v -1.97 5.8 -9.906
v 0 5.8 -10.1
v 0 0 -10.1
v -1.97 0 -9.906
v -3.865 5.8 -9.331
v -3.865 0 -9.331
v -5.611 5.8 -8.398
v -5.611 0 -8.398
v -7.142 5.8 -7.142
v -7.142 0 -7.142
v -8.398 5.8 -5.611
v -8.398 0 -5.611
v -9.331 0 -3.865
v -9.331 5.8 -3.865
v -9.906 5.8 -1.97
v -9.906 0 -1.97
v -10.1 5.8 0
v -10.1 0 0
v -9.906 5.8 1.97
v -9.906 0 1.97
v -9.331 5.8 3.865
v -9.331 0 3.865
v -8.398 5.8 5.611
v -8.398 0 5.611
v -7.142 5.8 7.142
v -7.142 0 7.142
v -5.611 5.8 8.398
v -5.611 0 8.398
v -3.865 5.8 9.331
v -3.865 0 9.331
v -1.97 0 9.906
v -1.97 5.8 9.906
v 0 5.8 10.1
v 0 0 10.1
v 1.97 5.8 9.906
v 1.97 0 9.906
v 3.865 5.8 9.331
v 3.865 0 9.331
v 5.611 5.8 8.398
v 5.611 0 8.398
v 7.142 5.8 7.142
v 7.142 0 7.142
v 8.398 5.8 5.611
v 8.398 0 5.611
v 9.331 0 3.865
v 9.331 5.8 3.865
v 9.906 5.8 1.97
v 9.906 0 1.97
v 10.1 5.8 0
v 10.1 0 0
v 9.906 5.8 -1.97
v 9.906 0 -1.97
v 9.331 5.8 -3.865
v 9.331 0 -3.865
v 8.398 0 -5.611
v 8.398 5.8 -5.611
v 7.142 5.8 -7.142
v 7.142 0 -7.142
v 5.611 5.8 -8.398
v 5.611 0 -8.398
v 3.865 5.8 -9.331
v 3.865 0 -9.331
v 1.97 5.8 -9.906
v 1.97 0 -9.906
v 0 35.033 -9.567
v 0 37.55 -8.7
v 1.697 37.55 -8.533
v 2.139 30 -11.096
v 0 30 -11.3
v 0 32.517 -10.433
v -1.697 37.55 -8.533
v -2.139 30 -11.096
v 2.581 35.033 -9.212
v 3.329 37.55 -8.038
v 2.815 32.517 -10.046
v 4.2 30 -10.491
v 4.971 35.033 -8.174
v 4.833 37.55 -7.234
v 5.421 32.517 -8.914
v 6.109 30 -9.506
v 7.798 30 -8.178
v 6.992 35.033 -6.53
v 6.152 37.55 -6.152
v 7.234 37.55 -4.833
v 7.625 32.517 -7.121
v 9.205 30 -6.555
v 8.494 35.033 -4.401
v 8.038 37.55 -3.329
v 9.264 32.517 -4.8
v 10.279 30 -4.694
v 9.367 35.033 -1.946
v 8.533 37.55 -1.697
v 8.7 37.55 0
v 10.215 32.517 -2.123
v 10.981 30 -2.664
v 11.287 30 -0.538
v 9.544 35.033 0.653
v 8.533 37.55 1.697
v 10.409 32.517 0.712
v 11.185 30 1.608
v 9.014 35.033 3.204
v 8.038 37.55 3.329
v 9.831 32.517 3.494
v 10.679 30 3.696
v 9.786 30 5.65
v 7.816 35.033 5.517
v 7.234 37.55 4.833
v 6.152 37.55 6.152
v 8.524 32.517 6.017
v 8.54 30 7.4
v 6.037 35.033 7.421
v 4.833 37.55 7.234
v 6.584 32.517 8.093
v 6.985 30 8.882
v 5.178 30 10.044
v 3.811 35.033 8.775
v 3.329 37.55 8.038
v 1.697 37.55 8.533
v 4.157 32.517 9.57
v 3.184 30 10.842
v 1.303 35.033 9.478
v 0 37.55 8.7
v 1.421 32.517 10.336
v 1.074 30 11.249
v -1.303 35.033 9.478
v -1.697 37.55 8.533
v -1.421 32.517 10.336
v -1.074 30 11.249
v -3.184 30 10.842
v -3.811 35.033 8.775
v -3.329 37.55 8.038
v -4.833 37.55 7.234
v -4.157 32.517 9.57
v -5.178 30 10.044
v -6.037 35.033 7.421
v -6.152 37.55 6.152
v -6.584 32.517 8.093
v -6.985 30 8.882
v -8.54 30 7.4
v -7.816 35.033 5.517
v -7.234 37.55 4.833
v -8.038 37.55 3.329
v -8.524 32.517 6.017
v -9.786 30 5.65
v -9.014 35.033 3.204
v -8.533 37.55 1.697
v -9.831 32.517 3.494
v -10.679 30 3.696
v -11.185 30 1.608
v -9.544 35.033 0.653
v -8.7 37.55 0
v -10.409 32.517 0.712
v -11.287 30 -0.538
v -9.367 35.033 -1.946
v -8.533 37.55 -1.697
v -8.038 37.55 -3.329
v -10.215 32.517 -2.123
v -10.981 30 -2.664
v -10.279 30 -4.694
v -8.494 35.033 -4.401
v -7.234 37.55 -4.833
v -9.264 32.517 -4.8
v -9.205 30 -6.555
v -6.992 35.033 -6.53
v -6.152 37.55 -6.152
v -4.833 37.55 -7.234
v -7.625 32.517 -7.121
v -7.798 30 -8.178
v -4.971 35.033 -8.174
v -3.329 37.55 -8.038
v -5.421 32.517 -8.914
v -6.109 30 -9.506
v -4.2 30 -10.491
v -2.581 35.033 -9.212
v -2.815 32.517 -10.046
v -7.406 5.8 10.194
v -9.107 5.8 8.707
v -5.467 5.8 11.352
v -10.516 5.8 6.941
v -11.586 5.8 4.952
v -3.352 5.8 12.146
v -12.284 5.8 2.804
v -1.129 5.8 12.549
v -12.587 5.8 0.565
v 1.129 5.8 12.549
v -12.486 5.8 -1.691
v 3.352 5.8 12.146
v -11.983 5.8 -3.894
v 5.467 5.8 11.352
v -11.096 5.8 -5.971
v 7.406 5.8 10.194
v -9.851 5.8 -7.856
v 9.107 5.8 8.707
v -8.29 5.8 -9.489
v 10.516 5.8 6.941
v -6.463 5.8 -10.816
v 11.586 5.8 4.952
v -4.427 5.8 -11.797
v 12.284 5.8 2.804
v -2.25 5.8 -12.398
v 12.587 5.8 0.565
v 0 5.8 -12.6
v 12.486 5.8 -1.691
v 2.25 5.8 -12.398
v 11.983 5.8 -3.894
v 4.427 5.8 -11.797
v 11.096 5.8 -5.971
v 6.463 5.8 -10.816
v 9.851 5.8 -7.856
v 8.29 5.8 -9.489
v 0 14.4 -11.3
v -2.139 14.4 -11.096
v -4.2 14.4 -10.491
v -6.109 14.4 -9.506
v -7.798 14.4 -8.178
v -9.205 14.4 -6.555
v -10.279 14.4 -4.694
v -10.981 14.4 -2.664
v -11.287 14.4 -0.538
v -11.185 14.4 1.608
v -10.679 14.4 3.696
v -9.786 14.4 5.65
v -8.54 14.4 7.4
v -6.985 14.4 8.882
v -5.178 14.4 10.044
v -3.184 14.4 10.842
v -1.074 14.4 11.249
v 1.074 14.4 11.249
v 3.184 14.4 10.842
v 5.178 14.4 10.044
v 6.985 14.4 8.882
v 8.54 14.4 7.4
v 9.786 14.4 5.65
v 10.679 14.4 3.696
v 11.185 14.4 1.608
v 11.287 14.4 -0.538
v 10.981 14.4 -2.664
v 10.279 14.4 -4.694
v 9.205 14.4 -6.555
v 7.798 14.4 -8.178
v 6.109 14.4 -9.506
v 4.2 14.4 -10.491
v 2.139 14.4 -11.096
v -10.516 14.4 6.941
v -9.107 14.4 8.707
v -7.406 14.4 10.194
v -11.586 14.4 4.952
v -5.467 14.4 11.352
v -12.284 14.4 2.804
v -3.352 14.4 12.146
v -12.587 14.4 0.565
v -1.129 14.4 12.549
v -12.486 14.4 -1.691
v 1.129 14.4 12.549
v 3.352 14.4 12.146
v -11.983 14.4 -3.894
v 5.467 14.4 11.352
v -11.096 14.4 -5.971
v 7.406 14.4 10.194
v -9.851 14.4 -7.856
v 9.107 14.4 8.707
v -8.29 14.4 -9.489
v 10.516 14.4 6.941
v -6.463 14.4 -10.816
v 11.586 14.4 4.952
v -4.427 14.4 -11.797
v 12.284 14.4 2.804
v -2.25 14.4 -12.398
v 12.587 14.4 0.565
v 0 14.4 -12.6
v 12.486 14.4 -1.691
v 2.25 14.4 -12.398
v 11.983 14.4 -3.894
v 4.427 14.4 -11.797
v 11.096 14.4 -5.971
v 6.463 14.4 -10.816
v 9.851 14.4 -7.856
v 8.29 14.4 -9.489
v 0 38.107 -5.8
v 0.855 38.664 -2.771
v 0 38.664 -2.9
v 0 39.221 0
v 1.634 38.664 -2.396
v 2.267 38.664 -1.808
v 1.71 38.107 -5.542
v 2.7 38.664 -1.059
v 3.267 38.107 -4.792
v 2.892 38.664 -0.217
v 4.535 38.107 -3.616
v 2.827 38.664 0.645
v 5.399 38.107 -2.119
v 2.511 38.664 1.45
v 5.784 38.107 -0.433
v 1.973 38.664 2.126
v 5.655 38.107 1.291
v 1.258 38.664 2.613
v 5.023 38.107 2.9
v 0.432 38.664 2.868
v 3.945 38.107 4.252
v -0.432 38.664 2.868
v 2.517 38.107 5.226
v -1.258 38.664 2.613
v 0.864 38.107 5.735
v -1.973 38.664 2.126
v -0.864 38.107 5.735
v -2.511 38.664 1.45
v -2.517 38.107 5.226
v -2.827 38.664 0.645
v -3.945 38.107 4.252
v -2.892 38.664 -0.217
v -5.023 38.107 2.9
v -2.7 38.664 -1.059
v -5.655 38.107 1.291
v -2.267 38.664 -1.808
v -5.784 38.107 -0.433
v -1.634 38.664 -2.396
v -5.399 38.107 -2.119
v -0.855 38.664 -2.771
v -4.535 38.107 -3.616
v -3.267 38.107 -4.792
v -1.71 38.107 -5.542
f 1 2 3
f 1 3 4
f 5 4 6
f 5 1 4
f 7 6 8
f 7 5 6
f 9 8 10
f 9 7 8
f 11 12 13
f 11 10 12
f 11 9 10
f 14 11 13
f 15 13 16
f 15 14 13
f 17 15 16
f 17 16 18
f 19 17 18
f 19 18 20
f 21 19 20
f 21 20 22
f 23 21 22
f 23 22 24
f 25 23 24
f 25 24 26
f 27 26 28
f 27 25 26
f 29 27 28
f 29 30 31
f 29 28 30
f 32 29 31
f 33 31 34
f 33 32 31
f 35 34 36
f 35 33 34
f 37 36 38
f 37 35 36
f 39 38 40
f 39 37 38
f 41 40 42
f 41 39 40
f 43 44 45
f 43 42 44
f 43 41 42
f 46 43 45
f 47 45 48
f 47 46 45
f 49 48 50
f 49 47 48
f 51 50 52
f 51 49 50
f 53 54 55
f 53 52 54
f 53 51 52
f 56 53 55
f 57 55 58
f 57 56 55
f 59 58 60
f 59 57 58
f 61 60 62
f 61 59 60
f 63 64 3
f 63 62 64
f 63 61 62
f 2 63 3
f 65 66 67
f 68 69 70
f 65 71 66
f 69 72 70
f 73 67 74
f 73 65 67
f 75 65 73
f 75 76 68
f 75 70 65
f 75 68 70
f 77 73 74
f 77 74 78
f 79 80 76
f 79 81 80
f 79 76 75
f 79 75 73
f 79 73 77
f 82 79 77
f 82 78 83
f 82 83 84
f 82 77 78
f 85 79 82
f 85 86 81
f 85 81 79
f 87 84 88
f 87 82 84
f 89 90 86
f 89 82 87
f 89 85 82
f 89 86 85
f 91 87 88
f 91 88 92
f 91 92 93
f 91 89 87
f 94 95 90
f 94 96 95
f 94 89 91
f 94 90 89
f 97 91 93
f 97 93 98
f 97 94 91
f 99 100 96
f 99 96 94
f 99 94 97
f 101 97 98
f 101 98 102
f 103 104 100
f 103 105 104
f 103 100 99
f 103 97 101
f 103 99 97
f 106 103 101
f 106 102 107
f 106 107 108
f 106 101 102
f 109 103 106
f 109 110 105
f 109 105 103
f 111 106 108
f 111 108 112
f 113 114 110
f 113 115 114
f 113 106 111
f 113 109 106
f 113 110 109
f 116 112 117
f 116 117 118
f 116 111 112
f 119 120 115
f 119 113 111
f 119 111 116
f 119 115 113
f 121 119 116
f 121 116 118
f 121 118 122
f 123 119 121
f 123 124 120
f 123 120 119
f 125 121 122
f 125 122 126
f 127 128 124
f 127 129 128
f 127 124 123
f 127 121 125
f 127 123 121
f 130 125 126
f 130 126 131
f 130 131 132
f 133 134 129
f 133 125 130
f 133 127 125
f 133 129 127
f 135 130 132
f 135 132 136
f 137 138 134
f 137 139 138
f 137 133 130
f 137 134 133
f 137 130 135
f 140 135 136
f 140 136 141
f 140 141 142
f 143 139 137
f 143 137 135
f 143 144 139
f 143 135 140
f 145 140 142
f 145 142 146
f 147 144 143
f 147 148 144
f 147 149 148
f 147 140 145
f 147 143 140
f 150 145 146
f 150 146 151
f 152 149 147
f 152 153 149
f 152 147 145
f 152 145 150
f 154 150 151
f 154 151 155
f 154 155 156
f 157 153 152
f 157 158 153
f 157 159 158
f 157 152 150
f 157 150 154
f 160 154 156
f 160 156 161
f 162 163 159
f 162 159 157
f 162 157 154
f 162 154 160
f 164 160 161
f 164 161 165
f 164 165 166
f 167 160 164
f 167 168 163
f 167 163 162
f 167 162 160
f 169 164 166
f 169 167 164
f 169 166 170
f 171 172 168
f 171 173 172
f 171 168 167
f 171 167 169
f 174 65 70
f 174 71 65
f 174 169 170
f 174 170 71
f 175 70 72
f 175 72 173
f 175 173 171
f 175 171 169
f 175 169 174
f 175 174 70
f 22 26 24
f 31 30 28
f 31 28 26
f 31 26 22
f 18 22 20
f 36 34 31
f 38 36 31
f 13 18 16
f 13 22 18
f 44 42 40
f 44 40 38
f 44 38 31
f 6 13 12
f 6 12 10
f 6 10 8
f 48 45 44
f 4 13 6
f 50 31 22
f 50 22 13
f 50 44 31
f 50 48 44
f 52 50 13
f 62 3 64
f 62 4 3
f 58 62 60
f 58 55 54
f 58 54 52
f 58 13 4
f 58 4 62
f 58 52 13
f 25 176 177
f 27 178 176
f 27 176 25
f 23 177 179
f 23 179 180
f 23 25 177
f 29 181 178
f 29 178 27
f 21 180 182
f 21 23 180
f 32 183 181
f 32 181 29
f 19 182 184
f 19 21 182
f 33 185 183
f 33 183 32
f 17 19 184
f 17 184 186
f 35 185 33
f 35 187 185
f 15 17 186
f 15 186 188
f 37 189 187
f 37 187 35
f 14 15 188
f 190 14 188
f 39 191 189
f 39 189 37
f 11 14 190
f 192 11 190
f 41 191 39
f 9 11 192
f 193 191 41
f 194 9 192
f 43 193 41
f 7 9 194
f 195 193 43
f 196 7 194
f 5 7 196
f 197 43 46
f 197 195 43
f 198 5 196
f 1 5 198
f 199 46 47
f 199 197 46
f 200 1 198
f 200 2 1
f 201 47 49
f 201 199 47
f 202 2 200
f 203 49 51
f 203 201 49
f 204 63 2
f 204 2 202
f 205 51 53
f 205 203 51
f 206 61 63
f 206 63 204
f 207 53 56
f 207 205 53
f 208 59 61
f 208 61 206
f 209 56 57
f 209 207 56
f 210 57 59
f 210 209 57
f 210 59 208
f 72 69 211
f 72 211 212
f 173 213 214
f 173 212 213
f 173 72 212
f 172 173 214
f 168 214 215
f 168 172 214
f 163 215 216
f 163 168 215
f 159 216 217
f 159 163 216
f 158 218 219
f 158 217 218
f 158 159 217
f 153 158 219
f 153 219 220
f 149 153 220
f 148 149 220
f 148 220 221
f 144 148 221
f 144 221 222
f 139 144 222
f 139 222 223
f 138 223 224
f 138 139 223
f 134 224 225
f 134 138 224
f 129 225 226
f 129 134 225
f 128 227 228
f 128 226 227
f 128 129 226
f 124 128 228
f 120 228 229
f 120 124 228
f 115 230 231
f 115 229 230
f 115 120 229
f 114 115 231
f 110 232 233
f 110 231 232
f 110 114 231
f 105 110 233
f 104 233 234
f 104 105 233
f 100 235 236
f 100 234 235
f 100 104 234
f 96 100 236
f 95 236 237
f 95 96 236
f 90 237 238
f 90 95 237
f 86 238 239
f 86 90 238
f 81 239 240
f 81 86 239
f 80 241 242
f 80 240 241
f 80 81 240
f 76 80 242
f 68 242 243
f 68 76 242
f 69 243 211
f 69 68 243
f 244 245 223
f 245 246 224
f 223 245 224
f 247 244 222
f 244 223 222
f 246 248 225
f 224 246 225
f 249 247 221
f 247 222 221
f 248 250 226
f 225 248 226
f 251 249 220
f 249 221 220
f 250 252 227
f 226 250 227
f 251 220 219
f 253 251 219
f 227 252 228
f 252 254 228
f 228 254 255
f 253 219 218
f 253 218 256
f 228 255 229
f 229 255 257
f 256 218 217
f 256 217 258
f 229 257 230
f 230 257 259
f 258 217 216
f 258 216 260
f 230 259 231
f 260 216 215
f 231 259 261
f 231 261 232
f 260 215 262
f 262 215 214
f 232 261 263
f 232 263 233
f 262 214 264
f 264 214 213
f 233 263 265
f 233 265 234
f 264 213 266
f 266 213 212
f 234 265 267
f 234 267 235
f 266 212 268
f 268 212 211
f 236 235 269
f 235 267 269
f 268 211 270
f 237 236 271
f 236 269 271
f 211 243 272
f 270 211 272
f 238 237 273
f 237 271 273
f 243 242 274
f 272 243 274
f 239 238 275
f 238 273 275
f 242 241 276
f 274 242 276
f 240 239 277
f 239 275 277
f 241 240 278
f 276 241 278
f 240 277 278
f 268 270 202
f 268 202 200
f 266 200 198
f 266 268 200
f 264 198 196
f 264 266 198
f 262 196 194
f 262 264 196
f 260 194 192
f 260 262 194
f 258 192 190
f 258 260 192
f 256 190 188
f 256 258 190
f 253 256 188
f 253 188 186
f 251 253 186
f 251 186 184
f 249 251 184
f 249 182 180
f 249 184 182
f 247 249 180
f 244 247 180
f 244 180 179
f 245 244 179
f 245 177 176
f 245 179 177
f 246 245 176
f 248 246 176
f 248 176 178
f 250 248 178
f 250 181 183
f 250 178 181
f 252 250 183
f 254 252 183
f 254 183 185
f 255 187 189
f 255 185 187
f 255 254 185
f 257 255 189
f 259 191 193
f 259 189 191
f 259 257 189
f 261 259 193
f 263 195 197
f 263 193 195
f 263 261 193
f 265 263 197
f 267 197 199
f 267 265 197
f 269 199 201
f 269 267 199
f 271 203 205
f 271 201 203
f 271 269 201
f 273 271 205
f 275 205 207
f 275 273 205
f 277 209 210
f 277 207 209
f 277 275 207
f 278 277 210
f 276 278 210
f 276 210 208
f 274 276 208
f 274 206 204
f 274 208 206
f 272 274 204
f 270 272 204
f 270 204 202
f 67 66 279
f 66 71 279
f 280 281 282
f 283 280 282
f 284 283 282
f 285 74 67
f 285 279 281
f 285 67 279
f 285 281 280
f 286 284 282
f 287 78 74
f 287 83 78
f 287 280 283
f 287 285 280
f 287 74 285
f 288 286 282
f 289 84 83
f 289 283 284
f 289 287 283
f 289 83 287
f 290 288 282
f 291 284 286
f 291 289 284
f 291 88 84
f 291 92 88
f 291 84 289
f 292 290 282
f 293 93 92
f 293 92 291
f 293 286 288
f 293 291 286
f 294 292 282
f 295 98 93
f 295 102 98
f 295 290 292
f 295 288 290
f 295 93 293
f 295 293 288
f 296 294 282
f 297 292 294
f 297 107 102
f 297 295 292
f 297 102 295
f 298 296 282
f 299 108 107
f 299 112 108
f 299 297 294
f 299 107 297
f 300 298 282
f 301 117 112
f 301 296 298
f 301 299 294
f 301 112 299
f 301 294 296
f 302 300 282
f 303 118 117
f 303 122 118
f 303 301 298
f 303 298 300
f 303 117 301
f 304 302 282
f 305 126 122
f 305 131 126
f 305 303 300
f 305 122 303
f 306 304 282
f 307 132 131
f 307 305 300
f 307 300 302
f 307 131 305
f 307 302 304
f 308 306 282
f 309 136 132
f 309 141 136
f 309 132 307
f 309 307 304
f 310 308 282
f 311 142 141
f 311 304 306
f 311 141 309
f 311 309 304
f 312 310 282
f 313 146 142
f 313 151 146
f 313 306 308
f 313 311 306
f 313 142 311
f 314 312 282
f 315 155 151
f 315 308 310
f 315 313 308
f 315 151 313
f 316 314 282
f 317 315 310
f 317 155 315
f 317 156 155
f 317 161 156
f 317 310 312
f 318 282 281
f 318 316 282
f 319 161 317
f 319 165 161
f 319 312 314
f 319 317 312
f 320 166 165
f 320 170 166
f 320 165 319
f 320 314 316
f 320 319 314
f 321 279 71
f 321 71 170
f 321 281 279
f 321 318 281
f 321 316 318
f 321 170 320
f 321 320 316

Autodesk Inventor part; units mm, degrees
ref_plane "YZ Plane" through (0, 0, 0) normal (1, 0, 0) x (0, 1, 0)
ref_plane "XZ Plane" through (0, 0, 0) normal (0, 1, 0) x (-1, 0, 0)
ref_plane "XY Plane" through (0, 0, 0) normal (0, 0, 1) x (1, 0, 0)
sketch "Sketch1" plane through (0, 0, 0) normal (1, 0, 0) x (0, 1, 0)
  line L0 (0, 0) -> (0, -10.1)
  line L1 (0, -10.1) -> (5.8, -10.1)
  line L2 (5.8, -10.1) -> (5.8, -12.6)
  line L3 (5.8, -12.6) -> (14.4, -12.6)
  line L4 (14.4, -12.6) -> (14.4, -11.3)
  line L5 (14.4, -11.3) -> (30, -11.3)
  line L6 (30, -11.3) -> (37.55, -11.3)
  line L7 (37.55, -11.3) -> (37.55, -8.7)
  line L8 (37.55, -8.7) -> (30, -11.3)
  line L9 (37.55, -8.7) -> (39.2214, 0)
  line L10 (39.2214, 0) -> (0, 0)
  dimension "d0" = 10.1
  dimension "d1" = 5.8
  dimension "d2" = 90
  dimension "d3" = 2.5
  dimension "d4" = 90
  dimension "d5" = 8.6
  dimension "d6" = 1.3
  dimension "d7" = 90
  dimension "d8" = 15.6
  dimension "d9" = 7.55
  dimension "d10" = 2.6
revolve "Revolution1" add sketch "Sketch1" angle 360 about axis through (0, 39.2214, 0) along (0, -1, 0) contours L10 L9 L8 L5 L4 L3 L2 L1 L0
properties part number "30_CUBE_openSIM_ObjectiveLens_10x"
